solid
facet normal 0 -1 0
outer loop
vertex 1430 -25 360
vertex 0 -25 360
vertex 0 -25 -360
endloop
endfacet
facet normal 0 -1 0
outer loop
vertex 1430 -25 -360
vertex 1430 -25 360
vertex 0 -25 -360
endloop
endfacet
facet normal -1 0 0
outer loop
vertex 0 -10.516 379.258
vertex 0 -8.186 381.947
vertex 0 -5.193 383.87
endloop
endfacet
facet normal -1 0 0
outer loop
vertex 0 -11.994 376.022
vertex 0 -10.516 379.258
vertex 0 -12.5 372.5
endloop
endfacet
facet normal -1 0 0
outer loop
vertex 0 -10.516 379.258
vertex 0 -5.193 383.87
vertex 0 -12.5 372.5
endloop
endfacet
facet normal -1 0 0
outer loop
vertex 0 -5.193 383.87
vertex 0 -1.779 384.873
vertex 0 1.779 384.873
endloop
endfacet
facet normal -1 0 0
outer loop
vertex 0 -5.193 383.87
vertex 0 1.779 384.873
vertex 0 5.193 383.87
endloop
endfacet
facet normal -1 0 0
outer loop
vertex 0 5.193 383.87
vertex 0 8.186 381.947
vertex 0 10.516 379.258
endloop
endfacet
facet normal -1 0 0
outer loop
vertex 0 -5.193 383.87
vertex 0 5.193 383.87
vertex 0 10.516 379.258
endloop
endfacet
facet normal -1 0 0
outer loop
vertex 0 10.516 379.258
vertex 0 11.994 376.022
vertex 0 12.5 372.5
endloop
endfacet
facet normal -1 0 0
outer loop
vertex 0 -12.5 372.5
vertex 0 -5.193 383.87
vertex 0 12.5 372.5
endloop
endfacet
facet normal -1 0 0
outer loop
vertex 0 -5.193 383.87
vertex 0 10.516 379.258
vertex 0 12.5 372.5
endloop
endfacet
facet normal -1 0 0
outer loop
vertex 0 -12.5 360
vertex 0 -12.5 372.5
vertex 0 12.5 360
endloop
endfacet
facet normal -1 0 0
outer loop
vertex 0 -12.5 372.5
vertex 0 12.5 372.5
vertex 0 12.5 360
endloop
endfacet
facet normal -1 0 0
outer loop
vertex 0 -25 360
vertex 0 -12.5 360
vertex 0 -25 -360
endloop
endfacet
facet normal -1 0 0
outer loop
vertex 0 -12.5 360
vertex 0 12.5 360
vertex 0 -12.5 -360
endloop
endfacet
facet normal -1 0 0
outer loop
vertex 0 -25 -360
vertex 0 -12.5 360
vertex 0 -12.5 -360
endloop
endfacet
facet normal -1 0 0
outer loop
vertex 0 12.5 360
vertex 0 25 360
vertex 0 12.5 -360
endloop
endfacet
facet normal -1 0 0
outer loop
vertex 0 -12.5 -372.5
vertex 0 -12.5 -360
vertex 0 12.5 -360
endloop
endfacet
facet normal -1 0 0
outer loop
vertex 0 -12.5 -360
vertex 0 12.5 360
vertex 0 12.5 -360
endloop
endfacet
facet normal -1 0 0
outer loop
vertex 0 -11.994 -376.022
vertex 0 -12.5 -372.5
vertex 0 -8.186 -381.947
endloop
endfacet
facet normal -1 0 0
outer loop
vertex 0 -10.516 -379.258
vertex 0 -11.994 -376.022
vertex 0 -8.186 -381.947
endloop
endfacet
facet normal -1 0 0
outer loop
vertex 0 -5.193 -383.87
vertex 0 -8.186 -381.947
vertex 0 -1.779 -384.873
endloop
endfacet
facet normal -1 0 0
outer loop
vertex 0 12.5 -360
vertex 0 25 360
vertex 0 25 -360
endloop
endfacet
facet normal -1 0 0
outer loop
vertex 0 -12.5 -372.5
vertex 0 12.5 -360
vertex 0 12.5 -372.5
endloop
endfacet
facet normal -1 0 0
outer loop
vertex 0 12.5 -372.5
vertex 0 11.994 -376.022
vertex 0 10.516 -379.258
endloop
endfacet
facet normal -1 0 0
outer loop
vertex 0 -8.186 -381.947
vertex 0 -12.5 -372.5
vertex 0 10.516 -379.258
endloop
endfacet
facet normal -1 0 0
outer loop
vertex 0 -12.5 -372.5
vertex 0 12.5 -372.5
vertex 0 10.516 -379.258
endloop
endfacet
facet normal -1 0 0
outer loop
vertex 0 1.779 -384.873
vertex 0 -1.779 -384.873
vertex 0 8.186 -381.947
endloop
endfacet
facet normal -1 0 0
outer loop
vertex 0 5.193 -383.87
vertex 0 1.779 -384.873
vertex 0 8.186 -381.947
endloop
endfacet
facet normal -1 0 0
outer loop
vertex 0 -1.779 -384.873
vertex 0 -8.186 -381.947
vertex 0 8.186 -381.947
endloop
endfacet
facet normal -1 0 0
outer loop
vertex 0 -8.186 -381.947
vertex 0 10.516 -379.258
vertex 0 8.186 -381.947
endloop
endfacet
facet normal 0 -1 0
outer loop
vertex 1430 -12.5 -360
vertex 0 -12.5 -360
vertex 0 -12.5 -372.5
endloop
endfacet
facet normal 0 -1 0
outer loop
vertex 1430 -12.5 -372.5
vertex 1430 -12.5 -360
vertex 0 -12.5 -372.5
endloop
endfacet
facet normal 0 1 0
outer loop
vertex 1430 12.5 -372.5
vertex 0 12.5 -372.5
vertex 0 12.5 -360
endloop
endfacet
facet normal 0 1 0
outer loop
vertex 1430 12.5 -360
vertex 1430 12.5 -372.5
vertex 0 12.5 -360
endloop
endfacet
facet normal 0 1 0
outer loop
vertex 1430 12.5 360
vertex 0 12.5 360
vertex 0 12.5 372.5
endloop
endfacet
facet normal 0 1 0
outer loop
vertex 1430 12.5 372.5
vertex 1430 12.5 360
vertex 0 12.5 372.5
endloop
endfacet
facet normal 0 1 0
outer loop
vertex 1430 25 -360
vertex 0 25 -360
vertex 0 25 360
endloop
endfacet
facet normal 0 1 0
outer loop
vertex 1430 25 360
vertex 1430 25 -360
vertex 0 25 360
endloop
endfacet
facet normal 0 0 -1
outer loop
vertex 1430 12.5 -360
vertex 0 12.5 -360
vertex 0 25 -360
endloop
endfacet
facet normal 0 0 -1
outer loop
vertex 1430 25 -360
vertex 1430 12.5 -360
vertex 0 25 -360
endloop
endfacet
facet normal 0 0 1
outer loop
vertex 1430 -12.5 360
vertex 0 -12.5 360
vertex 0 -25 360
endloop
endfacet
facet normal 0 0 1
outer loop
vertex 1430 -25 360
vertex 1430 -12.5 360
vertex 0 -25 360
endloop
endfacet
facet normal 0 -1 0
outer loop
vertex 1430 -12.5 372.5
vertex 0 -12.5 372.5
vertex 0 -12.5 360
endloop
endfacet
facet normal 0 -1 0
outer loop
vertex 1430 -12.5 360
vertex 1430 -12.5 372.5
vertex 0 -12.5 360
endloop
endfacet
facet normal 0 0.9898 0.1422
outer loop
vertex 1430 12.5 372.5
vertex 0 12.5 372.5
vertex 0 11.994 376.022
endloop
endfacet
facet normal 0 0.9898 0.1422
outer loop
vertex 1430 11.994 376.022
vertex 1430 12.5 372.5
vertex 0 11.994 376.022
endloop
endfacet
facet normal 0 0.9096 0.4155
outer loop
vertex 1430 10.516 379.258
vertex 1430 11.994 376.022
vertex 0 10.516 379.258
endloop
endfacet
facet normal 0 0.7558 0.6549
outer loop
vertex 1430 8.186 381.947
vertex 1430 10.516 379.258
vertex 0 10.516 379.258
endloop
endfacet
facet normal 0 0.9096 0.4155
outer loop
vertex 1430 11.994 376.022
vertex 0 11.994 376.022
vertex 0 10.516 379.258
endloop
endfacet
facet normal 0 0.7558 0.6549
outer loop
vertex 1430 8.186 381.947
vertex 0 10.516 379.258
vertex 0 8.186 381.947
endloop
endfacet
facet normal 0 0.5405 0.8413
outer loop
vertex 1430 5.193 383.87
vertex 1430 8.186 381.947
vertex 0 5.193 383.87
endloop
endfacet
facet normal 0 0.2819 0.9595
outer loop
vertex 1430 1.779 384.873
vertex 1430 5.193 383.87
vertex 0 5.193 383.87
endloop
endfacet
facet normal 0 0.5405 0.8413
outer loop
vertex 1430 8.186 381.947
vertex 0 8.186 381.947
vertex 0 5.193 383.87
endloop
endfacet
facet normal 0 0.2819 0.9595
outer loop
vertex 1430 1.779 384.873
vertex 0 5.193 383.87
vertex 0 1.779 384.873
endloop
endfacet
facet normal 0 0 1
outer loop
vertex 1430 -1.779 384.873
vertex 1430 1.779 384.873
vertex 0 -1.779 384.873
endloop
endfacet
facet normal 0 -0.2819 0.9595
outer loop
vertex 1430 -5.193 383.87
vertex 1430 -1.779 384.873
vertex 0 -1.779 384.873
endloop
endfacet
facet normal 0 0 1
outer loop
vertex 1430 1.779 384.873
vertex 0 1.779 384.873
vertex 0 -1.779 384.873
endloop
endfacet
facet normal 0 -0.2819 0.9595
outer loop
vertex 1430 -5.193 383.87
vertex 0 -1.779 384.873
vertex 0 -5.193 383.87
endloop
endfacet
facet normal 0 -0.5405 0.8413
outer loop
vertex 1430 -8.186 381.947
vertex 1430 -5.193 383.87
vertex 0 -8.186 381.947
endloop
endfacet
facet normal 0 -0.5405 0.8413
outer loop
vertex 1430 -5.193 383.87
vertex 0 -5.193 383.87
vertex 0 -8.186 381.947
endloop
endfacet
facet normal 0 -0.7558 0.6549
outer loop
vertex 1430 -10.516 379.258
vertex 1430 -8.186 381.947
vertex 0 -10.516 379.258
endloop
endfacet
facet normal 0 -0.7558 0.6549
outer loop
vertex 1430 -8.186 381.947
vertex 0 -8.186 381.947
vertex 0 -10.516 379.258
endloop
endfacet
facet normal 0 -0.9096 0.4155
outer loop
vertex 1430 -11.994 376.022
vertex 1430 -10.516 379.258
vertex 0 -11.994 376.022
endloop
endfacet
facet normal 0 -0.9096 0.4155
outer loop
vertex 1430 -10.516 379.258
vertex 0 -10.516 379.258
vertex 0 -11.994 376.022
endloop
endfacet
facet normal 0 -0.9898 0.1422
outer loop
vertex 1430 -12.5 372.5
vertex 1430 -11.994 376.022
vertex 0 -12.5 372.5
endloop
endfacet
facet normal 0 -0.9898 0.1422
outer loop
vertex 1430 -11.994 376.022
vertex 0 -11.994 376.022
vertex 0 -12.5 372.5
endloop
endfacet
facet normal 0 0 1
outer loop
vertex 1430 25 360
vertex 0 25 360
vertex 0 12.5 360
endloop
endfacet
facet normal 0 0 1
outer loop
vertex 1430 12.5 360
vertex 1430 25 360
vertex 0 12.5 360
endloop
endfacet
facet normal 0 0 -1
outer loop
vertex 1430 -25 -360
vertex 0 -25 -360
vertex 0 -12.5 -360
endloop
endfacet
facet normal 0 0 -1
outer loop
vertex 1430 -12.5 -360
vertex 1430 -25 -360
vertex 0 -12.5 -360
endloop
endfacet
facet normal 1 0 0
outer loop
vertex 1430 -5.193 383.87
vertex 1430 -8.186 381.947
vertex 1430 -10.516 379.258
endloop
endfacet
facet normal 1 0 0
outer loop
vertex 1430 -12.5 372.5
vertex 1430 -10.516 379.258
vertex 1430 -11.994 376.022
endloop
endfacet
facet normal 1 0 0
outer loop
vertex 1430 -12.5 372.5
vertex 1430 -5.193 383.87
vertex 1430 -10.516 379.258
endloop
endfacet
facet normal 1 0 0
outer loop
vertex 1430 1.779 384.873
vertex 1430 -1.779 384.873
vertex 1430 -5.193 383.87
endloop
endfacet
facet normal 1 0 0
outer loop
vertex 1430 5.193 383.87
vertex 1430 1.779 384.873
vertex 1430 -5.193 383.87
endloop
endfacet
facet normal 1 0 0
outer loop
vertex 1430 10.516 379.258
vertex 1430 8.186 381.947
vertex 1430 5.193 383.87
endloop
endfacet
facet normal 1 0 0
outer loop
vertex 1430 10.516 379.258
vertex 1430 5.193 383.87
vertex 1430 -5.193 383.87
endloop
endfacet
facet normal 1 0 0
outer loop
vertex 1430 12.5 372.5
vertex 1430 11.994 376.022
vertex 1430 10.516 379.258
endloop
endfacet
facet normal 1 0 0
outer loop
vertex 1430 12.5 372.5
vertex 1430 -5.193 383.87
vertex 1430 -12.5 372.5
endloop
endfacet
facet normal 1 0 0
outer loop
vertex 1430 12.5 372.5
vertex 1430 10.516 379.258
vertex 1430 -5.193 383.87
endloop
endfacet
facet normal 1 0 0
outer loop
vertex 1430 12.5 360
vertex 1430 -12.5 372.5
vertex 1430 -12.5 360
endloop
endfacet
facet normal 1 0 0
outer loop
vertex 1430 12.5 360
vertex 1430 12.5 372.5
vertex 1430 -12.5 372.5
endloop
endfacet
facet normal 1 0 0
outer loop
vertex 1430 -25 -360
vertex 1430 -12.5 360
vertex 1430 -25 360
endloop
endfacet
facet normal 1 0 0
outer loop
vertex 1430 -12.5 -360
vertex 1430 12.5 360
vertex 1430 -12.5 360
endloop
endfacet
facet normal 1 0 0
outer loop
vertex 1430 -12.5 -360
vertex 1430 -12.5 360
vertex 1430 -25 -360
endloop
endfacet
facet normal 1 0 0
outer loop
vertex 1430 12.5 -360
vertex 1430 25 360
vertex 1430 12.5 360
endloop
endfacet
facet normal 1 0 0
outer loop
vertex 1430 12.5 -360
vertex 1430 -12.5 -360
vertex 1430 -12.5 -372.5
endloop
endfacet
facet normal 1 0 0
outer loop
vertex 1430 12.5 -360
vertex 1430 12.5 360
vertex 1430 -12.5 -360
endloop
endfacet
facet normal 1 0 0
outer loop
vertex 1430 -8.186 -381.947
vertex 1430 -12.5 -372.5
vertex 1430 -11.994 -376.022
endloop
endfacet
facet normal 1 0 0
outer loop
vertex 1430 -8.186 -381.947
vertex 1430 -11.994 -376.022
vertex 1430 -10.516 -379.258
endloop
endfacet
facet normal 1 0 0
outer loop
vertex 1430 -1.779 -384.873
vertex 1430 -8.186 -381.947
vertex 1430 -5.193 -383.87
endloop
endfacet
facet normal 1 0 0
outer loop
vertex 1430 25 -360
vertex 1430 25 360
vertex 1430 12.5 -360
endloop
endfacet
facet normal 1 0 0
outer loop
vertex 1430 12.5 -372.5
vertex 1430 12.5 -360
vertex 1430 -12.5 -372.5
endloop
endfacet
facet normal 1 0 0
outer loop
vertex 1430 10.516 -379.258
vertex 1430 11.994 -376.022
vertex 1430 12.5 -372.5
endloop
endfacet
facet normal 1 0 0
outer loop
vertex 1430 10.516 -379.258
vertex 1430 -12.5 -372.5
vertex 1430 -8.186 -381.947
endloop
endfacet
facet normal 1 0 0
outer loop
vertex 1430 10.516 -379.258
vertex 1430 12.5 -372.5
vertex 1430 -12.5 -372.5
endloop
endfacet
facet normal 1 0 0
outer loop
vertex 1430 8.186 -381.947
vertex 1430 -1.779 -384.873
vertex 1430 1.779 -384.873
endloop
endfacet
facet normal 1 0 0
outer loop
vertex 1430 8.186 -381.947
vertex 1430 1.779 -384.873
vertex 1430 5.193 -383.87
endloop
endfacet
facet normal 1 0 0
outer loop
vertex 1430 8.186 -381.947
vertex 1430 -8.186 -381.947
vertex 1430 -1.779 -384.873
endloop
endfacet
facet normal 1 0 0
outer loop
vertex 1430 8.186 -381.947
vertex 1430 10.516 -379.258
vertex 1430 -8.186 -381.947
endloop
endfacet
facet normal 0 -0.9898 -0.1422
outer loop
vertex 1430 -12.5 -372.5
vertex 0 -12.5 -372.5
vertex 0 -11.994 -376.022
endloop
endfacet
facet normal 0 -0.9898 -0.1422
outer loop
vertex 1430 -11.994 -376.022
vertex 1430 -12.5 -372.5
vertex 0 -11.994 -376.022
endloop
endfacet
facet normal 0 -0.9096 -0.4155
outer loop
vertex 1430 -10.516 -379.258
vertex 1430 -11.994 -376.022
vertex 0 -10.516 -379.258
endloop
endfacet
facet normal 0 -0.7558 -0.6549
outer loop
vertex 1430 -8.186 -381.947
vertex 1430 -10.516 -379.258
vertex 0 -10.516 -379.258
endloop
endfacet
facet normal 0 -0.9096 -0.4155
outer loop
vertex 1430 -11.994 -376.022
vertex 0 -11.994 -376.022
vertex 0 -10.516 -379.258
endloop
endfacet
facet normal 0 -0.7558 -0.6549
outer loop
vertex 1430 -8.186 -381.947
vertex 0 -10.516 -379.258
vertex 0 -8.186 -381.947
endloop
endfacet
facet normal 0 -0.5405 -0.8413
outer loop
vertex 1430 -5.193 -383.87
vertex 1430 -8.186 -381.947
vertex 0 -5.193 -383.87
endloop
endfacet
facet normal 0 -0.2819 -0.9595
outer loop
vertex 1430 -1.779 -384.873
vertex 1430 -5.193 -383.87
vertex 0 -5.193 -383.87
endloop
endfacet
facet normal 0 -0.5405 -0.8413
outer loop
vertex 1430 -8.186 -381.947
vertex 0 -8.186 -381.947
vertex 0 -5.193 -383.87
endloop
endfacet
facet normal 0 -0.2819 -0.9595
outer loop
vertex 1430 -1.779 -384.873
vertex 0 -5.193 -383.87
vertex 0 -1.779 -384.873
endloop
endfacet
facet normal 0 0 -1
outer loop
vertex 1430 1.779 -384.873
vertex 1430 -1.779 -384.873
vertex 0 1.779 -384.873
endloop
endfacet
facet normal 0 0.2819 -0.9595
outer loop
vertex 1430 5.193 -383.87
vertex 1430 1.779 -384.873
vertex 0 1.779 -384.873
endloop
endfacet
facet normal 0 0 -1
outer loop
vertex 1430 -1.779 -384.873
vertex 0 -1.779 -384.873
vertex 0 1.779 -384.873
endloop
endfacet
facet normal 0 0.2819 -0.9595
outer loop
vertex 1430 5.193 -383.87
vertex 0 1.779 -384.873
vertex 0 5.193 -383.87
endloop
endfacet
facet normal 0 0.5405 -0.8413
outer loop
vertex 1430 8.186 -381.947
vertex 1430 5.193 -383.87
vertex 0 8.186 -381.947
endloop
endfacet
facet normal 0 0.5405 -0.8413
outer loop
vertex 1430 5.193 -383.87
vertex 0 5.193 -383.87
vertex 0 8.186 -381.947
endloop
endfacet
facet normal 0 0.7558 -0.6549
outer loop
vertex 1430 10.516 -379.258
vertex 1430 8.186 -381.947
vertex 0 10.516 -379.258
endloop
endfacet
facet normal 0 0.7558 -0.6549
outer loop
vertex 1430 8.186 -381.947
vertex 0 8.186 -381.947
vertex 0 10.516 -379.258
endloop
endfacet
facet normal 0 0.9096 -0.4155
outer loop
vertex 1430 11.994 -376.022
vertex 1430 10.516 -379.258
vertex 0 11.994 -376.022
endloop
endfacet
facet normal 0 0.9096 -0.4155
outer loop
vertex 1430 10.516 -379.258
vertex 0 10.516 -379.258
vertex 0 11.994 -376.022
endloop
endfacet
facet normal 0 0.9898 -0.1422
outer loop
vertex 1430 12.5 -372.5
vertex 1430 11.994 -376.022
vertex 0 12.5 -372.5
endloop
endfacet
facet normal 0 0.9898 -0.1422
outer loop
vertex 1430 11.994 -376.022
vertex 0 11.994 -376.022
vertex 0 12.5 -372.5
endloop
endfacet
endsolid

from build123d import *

# Parameters (mm, degrees)
BOSS_EXTRUDE1_DEPTH = 1430


with BuildPart() as part:
    # Sketch1 → Boss-Extrude1 (new body)
    with BuildSketch(Plane(origin=(0, 0, 0), x_dir=(0, 0, -1), z_dir=(1, 0, 0))):
        with BuildLine():
            Line((360, 25), (-360, 25))
            Line((-360, 25), (-360, 12.5))
            Line((-360, 12.5), (-347.5, 12.5))
            ThreePointArc((-347.5, 12.5), (-335, 0), (-347.5, -12.5))
            Line((-347.5, -12.5), (-360, -12.5))
            Line((-360, -12.5), (-360, -25))
            Line((-360, -25), (360, -25))
            Line((360, -25), (360, -12.5))
            Line((360, -12.5), (347.5, -12.5))
            ThreePointArc((347.5, -12.5), (335, 0), (347.5, 12.5))
            Line((347.5, 12.5), (360, 12.5))
            Line((360, 12.5), (360, 25))
        make_face()
        with BuildLine():
            Line((-347.5, 12.5), (-360, 12.5))
            Line((-360, 12.5), (-360, -12.5))
            Line((-360, -12.5), (-347.5, -12.5))
            ThreePointArc((-347.5, -12.5), (-335, 0), (-347.5, 12.5))
        make_face()
        with BuildLine():
            Line((-360, -12.5), (-360, 12.5))
            Line((-360, 12.5), (-372.5, 12.5))
            ThreePointArc((-372.5, 12.5), (-385, 0), (-372.5, -12.5))
            Line((-372.5, -12.5), (-360, -12.5))
        make_face()
        with BuildLine():
            Line((372.5, 12.5), (360, 12.5))
            Line((360, 12.5), (360, -12.5))
            Line((360, -12.5), (372.5, -12.5))
            ThreePointArc((372.5, -12.5), (385, 0), (372.5, 12.5))
        make_face()
        with BuildLine():
            Line((360, -12.5), (360, 12.5))
            Line((360, 12.5), (347.5, 12.5))
            ThreePointArc((347.5, 12.5), (335, 0), (347.5, -12.5))
            Line((347.5, -12.5), (360, -12.5))
        make_face()
    extrude(amount=BOSS_EXTRUDE1_DEPTH)


solid = part.part
